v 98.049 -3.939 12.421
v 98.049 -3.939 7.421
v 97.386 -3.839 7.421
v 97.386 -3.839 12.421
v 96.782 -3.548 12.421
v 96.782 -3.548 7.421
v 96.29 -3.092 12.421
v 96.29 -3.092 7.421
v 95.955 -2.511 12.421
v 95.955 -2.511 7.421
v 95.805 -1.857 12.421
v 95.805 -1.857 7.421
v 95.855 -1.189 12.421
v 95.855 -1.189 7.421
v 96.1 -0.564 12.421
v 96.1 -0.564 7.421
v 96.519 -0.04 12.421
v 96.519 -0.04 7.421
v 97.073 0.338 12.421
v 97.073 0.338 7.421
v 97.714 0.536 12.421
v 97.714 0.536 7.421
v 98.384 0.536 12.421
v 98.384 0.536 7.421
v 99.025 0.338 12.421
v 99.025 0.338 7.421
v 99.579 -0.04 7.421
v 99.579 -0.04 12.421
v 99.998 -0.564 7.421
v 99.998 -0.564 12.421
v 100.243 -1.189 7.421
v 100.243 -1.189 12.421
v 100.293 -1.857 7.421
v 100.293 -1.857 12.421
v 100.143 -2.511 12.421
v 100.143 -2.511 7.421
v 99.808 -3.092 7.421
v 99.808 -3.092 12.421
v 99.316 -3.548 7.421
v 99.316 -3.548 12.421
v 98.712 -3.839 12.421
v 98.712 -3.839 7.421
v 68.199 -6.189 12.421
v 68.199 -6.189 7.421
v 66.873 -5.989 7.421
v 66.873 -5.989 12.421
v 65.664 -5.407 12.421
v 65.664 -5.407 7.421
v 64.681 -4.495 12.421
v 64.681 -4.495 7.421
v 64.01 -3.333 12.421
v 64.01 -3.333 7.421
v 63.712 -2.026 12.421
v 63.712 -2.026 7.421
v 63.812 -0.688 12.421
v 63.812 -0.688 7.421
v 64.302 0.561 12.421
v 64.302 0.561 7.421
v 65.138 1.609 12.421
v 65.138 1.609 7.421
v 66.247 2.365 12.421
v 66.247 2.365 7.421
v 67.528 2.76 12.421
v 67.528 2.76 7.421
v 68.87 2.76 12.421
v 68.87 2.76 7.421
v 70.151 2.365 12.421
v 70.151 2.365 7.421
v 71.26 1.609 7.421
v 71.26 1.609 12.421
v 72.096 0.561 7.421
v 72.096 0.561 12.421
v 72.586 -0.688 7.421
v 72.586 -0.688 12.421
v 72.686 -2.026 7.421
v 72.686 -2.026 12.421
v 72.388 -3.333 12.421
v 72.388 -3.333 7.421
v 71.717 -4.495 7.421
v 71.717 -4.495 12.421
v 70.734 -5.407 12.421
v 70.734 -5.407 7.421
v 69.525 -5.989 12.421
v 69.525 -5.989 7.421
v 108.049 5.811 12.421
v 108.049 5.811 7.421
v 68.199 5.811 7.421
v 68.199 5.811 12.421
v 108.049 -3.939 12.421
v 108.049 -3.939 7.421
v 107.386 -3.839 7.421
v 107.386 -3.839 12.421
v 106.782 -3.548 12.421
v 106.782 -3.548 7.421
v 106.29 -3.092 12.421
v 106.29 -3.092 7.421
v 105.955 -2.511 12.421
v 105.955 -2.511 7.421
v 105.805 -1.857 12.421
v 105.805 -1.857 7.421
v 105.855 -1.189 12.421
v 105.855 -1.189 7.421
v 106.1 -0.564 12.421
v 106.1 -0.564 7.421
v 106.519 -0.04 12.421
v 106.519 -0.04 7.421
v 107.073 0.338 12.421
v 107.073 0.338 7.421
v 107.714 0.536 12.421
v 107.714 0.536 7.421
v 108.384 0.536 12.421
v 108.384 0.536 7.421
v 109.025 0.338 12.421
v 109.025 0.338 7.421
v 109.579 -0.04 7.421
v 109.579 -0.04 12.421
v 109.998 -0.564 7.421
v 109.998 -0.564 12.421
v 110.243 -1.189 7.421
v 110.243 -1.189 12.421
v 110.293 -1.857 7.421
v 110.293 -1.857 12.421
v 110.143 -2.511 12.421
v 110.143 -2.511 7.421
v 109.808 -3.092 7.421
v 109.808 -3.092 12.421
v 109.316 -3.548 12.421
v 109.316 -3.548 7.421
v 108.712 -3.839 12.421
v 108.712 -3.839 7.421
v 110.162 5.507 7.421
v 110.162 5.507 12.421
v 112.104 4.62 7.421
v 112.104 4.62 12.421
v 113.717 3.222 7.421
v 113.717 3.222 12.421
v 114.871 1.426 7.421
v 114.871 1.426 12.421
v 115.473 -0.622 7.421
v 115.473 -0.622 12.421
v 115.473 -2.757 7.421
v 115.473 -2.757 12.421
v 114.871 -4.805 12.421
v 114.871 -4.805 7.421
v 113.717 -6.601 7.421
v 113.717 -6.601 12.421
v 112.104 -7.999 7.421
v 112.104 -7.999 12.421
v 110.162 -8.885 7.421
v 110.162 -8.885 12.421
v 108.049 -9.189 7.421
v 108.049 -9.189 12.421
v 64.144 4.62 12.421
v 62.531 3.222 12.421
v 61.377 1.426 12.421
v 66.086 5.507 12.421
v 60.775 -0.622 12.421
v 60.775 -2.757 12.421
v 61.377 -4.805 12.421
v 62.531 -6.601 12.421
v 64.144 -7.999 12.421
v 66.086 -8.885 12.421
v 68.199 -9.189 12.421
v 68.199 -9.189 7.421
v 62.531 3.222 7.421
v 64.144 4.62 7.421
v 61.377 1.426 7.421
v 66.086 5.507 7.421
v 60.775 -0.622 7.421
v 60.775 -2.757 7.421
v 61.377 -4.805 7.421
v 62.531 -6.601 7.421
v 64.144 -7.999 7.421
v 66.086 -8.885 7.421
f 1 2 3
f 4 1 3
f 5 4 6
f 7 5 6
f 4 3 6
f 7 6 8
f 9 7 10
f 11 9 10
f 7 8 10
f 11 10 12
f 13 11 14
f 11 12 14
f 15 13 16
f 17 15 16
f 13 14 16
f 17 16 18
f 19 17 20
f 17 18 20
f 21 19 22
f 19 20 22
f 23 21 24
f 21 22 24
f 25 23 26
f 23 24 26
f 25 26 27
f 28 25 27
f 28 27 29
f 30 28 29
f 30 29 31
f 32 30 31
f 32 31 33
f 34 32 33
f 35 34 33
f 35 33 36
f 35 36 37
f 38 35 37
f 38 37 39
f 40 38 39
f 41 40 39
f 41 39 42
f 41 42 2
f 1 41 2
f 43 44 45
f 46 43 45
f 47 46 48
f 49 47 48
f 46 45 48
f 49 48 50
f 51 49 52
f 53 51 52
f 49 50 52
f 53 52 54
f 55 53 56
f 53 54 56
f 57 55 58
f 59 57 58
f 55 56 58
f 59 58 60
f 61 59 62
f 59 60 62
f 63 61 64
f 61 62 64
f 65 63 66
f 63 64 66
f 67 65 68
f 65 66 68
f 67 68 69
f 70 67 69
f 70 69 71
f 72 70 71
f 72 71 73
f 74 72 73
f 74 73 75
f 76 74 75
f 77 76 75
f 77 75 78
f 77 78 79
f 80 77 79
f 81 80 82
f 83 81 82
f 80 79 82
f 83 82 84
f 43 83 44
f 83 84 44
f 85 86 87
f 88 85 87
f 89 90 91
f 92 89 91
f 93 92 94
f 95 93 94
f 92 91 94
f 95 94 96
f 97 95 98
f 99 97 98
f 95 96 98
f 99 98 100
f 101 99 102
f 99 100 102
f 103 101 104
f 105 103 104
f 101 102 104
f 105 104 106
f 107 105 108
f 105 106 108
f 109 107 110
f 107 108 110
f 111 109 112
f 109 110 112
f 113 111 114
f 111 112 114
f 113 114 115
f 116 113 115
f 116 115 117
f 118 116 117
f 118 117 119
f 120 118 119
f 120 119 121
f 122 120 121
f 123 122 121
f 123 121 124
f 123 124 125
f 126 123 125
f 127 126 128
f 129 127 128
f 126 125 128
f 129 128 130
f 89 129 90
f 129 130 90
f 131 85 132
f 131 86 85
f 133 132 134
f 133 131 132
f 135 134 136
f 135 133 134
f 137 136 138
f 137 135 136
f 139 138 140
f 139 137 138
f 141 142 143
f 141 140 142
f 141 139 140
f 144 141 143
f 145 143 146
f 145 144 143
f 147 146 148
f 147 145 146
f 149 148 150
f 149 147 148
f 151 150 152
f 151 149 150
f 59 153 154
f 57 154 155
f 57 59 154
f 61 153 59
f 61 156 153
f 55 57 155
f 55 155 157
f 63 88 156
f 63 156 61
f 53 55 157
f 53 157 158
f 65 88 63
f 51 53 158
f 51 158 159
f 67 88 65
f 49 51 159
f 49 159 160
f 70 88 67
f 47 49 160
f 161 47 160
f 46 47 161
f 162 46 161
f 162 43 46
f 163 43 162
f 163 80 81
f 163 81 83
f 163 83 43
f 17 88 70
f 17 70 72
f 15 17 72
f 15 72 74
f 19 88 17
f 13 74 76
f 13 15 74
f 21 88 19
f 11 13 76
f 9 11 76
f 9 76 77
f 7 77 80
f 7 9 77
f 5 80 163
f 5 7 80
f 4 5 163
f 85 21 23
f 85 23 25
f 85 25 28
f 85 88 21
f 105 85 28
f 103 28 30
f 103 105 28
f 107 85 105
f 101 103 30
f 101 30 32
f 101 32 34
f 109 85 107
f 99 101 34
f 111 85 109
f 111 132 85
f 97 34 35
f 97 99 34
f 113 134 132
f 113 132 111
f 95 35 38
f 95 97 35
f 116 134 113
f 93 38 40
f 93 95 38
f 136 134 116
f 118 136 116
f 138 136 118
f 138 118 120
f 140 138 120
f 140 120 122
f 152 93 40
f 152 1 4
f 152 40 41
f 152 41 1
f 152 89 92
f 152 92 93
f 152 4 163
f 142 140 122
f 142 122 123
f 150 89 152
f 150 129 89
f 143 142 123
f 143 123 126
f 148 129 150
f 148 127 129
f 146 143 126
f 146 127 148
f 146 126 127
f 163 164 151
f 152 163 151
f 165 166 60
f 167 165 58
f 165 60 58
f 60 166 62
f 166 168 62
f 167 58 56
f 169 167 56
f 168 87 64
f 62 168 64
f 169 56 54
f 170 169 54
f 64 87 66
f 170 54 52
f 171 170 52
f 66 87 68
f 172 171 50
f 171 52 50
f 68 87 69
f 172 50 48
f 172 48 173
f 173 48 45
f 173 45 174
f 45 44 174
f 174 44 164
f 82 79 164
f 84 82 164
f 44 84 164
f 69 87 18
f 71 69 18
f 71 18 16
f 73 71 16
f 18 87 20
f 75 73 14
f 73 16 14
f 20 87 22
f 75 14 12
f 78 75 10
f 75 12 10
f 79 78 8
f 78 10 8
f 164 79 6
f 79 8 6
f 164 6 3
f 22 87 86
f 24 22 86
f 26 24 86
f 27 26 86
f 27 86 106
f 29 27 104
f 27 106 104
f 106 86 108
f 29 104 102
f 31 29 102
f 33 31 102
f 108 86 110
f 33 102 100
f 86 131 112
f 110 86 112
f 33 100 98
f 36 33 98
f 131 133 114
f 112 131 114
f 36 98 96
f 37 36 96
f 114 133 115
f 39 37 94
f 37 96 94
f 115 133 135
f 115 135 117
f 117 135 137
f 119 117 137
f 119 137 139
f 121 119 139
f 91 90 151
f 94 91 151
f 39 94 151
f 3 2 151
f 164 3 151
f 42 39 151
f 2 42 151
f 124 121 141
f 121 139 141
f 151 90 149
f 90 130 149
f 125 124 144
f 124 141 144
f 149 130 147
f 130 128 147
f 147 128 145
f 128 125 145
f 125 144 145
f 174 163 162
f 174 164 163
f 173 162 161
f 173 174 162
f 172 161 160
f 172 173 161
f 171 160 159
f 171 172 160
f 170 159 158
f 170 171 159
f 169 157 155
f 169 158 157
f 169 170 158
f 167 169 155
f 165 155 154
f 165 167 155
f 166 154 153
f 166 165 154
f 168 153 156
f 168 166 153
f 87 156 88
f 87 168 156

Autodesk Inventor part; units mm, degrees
ref_plane "YZ Plane" through (0, 0, 0) normal (1, 0, 0) x (0, 1, 0)
ref_plane "XZ Plane" through (0, 0, 0) normal (0, 1, 0) x (-1, 0, 0)
ref_plane "XY Plane" through (0, 0, 0) normal (0, 0, 1) x (1, 0, 0)
ref_plane "Work Plane1" through (88.049, 6.8107, 7.4208) normal (0, 0, 1) x (0, -1, 0)
sketch "Sketch1" plane through (88.049, 6.8107, 7.4208) normal (0, 0, 1) x (0, -1, 0)
  circle A0 centre (8.5, 0) radius 2.55 construction
  line L0 (38.25, 32.75) -> (-21.25, 32.75) projected
  circle A1 centre (8.5, -19.85) radius 4 construction
  line L1 (8.5, -19.85) -> (8.5, 20) construction
  line L2 (16, -19.85) -> (16, 20)
  line L3 (1, 20) -> (1, -19.85)
  arc A2 (1, -19.85) -> (16, -19.85) centre (8.5, -19.85) ccw
  arc A3 (16, 20) -> (1, 20) centre (8.5, 20) ccw
  point P0 (6.8107, -88.049)
  point P1 (8.5, 0.075)
  dimension "d0" = 15
  dimension "d20" = 20
extrude "Extrusion1" add sketch "Sketch1" along normal blind 5
sketch "Sketch2" plane through (88.049, 6.8107, 12.4208) normal (0, 0, 1) x (1, 0, 0)
  circle A0 centre (-19.85, -8.5) radius 4 construction
  circle A1 centre (0, -8.5) radius 2.55 construction
  line L0 (0, -8.5) -> (22.0742, -8.5) construction
  point P0 (-88.049, -6.8107)
  point P1 (10, -8.5)
  point P2 (20, -8.5)
  dimension "d4" = 10
  dimension "d5" = 10
hole "Hole1" at (98.049, -1.6893, 12.4208) at (108.049, -1.6893, 12.4208) direction (0, 0, -1) diameter 4.5 depth 6 clearance for "Countersunk Flat Head Screw DIN EN ISO 2009" size "M4" standard "DIN"
sketch "Sketch3" plane through (88.049, 6.8107, 12.4208) normal (0, 0, 1) x (1, 0, 0)
  point P0 (-88.049, -6.8107)
  point P1 (-19.85, -8.5)
hole "Hole2" at (68.199, -1.6893, 12.4208) direction (0, 0, -1) diameter 9 depth 6 clearance for "Slotted Cheese Head Screw DIN 84" size "M8" standard "DIN"
properties part number "GantryAxisHolder"
